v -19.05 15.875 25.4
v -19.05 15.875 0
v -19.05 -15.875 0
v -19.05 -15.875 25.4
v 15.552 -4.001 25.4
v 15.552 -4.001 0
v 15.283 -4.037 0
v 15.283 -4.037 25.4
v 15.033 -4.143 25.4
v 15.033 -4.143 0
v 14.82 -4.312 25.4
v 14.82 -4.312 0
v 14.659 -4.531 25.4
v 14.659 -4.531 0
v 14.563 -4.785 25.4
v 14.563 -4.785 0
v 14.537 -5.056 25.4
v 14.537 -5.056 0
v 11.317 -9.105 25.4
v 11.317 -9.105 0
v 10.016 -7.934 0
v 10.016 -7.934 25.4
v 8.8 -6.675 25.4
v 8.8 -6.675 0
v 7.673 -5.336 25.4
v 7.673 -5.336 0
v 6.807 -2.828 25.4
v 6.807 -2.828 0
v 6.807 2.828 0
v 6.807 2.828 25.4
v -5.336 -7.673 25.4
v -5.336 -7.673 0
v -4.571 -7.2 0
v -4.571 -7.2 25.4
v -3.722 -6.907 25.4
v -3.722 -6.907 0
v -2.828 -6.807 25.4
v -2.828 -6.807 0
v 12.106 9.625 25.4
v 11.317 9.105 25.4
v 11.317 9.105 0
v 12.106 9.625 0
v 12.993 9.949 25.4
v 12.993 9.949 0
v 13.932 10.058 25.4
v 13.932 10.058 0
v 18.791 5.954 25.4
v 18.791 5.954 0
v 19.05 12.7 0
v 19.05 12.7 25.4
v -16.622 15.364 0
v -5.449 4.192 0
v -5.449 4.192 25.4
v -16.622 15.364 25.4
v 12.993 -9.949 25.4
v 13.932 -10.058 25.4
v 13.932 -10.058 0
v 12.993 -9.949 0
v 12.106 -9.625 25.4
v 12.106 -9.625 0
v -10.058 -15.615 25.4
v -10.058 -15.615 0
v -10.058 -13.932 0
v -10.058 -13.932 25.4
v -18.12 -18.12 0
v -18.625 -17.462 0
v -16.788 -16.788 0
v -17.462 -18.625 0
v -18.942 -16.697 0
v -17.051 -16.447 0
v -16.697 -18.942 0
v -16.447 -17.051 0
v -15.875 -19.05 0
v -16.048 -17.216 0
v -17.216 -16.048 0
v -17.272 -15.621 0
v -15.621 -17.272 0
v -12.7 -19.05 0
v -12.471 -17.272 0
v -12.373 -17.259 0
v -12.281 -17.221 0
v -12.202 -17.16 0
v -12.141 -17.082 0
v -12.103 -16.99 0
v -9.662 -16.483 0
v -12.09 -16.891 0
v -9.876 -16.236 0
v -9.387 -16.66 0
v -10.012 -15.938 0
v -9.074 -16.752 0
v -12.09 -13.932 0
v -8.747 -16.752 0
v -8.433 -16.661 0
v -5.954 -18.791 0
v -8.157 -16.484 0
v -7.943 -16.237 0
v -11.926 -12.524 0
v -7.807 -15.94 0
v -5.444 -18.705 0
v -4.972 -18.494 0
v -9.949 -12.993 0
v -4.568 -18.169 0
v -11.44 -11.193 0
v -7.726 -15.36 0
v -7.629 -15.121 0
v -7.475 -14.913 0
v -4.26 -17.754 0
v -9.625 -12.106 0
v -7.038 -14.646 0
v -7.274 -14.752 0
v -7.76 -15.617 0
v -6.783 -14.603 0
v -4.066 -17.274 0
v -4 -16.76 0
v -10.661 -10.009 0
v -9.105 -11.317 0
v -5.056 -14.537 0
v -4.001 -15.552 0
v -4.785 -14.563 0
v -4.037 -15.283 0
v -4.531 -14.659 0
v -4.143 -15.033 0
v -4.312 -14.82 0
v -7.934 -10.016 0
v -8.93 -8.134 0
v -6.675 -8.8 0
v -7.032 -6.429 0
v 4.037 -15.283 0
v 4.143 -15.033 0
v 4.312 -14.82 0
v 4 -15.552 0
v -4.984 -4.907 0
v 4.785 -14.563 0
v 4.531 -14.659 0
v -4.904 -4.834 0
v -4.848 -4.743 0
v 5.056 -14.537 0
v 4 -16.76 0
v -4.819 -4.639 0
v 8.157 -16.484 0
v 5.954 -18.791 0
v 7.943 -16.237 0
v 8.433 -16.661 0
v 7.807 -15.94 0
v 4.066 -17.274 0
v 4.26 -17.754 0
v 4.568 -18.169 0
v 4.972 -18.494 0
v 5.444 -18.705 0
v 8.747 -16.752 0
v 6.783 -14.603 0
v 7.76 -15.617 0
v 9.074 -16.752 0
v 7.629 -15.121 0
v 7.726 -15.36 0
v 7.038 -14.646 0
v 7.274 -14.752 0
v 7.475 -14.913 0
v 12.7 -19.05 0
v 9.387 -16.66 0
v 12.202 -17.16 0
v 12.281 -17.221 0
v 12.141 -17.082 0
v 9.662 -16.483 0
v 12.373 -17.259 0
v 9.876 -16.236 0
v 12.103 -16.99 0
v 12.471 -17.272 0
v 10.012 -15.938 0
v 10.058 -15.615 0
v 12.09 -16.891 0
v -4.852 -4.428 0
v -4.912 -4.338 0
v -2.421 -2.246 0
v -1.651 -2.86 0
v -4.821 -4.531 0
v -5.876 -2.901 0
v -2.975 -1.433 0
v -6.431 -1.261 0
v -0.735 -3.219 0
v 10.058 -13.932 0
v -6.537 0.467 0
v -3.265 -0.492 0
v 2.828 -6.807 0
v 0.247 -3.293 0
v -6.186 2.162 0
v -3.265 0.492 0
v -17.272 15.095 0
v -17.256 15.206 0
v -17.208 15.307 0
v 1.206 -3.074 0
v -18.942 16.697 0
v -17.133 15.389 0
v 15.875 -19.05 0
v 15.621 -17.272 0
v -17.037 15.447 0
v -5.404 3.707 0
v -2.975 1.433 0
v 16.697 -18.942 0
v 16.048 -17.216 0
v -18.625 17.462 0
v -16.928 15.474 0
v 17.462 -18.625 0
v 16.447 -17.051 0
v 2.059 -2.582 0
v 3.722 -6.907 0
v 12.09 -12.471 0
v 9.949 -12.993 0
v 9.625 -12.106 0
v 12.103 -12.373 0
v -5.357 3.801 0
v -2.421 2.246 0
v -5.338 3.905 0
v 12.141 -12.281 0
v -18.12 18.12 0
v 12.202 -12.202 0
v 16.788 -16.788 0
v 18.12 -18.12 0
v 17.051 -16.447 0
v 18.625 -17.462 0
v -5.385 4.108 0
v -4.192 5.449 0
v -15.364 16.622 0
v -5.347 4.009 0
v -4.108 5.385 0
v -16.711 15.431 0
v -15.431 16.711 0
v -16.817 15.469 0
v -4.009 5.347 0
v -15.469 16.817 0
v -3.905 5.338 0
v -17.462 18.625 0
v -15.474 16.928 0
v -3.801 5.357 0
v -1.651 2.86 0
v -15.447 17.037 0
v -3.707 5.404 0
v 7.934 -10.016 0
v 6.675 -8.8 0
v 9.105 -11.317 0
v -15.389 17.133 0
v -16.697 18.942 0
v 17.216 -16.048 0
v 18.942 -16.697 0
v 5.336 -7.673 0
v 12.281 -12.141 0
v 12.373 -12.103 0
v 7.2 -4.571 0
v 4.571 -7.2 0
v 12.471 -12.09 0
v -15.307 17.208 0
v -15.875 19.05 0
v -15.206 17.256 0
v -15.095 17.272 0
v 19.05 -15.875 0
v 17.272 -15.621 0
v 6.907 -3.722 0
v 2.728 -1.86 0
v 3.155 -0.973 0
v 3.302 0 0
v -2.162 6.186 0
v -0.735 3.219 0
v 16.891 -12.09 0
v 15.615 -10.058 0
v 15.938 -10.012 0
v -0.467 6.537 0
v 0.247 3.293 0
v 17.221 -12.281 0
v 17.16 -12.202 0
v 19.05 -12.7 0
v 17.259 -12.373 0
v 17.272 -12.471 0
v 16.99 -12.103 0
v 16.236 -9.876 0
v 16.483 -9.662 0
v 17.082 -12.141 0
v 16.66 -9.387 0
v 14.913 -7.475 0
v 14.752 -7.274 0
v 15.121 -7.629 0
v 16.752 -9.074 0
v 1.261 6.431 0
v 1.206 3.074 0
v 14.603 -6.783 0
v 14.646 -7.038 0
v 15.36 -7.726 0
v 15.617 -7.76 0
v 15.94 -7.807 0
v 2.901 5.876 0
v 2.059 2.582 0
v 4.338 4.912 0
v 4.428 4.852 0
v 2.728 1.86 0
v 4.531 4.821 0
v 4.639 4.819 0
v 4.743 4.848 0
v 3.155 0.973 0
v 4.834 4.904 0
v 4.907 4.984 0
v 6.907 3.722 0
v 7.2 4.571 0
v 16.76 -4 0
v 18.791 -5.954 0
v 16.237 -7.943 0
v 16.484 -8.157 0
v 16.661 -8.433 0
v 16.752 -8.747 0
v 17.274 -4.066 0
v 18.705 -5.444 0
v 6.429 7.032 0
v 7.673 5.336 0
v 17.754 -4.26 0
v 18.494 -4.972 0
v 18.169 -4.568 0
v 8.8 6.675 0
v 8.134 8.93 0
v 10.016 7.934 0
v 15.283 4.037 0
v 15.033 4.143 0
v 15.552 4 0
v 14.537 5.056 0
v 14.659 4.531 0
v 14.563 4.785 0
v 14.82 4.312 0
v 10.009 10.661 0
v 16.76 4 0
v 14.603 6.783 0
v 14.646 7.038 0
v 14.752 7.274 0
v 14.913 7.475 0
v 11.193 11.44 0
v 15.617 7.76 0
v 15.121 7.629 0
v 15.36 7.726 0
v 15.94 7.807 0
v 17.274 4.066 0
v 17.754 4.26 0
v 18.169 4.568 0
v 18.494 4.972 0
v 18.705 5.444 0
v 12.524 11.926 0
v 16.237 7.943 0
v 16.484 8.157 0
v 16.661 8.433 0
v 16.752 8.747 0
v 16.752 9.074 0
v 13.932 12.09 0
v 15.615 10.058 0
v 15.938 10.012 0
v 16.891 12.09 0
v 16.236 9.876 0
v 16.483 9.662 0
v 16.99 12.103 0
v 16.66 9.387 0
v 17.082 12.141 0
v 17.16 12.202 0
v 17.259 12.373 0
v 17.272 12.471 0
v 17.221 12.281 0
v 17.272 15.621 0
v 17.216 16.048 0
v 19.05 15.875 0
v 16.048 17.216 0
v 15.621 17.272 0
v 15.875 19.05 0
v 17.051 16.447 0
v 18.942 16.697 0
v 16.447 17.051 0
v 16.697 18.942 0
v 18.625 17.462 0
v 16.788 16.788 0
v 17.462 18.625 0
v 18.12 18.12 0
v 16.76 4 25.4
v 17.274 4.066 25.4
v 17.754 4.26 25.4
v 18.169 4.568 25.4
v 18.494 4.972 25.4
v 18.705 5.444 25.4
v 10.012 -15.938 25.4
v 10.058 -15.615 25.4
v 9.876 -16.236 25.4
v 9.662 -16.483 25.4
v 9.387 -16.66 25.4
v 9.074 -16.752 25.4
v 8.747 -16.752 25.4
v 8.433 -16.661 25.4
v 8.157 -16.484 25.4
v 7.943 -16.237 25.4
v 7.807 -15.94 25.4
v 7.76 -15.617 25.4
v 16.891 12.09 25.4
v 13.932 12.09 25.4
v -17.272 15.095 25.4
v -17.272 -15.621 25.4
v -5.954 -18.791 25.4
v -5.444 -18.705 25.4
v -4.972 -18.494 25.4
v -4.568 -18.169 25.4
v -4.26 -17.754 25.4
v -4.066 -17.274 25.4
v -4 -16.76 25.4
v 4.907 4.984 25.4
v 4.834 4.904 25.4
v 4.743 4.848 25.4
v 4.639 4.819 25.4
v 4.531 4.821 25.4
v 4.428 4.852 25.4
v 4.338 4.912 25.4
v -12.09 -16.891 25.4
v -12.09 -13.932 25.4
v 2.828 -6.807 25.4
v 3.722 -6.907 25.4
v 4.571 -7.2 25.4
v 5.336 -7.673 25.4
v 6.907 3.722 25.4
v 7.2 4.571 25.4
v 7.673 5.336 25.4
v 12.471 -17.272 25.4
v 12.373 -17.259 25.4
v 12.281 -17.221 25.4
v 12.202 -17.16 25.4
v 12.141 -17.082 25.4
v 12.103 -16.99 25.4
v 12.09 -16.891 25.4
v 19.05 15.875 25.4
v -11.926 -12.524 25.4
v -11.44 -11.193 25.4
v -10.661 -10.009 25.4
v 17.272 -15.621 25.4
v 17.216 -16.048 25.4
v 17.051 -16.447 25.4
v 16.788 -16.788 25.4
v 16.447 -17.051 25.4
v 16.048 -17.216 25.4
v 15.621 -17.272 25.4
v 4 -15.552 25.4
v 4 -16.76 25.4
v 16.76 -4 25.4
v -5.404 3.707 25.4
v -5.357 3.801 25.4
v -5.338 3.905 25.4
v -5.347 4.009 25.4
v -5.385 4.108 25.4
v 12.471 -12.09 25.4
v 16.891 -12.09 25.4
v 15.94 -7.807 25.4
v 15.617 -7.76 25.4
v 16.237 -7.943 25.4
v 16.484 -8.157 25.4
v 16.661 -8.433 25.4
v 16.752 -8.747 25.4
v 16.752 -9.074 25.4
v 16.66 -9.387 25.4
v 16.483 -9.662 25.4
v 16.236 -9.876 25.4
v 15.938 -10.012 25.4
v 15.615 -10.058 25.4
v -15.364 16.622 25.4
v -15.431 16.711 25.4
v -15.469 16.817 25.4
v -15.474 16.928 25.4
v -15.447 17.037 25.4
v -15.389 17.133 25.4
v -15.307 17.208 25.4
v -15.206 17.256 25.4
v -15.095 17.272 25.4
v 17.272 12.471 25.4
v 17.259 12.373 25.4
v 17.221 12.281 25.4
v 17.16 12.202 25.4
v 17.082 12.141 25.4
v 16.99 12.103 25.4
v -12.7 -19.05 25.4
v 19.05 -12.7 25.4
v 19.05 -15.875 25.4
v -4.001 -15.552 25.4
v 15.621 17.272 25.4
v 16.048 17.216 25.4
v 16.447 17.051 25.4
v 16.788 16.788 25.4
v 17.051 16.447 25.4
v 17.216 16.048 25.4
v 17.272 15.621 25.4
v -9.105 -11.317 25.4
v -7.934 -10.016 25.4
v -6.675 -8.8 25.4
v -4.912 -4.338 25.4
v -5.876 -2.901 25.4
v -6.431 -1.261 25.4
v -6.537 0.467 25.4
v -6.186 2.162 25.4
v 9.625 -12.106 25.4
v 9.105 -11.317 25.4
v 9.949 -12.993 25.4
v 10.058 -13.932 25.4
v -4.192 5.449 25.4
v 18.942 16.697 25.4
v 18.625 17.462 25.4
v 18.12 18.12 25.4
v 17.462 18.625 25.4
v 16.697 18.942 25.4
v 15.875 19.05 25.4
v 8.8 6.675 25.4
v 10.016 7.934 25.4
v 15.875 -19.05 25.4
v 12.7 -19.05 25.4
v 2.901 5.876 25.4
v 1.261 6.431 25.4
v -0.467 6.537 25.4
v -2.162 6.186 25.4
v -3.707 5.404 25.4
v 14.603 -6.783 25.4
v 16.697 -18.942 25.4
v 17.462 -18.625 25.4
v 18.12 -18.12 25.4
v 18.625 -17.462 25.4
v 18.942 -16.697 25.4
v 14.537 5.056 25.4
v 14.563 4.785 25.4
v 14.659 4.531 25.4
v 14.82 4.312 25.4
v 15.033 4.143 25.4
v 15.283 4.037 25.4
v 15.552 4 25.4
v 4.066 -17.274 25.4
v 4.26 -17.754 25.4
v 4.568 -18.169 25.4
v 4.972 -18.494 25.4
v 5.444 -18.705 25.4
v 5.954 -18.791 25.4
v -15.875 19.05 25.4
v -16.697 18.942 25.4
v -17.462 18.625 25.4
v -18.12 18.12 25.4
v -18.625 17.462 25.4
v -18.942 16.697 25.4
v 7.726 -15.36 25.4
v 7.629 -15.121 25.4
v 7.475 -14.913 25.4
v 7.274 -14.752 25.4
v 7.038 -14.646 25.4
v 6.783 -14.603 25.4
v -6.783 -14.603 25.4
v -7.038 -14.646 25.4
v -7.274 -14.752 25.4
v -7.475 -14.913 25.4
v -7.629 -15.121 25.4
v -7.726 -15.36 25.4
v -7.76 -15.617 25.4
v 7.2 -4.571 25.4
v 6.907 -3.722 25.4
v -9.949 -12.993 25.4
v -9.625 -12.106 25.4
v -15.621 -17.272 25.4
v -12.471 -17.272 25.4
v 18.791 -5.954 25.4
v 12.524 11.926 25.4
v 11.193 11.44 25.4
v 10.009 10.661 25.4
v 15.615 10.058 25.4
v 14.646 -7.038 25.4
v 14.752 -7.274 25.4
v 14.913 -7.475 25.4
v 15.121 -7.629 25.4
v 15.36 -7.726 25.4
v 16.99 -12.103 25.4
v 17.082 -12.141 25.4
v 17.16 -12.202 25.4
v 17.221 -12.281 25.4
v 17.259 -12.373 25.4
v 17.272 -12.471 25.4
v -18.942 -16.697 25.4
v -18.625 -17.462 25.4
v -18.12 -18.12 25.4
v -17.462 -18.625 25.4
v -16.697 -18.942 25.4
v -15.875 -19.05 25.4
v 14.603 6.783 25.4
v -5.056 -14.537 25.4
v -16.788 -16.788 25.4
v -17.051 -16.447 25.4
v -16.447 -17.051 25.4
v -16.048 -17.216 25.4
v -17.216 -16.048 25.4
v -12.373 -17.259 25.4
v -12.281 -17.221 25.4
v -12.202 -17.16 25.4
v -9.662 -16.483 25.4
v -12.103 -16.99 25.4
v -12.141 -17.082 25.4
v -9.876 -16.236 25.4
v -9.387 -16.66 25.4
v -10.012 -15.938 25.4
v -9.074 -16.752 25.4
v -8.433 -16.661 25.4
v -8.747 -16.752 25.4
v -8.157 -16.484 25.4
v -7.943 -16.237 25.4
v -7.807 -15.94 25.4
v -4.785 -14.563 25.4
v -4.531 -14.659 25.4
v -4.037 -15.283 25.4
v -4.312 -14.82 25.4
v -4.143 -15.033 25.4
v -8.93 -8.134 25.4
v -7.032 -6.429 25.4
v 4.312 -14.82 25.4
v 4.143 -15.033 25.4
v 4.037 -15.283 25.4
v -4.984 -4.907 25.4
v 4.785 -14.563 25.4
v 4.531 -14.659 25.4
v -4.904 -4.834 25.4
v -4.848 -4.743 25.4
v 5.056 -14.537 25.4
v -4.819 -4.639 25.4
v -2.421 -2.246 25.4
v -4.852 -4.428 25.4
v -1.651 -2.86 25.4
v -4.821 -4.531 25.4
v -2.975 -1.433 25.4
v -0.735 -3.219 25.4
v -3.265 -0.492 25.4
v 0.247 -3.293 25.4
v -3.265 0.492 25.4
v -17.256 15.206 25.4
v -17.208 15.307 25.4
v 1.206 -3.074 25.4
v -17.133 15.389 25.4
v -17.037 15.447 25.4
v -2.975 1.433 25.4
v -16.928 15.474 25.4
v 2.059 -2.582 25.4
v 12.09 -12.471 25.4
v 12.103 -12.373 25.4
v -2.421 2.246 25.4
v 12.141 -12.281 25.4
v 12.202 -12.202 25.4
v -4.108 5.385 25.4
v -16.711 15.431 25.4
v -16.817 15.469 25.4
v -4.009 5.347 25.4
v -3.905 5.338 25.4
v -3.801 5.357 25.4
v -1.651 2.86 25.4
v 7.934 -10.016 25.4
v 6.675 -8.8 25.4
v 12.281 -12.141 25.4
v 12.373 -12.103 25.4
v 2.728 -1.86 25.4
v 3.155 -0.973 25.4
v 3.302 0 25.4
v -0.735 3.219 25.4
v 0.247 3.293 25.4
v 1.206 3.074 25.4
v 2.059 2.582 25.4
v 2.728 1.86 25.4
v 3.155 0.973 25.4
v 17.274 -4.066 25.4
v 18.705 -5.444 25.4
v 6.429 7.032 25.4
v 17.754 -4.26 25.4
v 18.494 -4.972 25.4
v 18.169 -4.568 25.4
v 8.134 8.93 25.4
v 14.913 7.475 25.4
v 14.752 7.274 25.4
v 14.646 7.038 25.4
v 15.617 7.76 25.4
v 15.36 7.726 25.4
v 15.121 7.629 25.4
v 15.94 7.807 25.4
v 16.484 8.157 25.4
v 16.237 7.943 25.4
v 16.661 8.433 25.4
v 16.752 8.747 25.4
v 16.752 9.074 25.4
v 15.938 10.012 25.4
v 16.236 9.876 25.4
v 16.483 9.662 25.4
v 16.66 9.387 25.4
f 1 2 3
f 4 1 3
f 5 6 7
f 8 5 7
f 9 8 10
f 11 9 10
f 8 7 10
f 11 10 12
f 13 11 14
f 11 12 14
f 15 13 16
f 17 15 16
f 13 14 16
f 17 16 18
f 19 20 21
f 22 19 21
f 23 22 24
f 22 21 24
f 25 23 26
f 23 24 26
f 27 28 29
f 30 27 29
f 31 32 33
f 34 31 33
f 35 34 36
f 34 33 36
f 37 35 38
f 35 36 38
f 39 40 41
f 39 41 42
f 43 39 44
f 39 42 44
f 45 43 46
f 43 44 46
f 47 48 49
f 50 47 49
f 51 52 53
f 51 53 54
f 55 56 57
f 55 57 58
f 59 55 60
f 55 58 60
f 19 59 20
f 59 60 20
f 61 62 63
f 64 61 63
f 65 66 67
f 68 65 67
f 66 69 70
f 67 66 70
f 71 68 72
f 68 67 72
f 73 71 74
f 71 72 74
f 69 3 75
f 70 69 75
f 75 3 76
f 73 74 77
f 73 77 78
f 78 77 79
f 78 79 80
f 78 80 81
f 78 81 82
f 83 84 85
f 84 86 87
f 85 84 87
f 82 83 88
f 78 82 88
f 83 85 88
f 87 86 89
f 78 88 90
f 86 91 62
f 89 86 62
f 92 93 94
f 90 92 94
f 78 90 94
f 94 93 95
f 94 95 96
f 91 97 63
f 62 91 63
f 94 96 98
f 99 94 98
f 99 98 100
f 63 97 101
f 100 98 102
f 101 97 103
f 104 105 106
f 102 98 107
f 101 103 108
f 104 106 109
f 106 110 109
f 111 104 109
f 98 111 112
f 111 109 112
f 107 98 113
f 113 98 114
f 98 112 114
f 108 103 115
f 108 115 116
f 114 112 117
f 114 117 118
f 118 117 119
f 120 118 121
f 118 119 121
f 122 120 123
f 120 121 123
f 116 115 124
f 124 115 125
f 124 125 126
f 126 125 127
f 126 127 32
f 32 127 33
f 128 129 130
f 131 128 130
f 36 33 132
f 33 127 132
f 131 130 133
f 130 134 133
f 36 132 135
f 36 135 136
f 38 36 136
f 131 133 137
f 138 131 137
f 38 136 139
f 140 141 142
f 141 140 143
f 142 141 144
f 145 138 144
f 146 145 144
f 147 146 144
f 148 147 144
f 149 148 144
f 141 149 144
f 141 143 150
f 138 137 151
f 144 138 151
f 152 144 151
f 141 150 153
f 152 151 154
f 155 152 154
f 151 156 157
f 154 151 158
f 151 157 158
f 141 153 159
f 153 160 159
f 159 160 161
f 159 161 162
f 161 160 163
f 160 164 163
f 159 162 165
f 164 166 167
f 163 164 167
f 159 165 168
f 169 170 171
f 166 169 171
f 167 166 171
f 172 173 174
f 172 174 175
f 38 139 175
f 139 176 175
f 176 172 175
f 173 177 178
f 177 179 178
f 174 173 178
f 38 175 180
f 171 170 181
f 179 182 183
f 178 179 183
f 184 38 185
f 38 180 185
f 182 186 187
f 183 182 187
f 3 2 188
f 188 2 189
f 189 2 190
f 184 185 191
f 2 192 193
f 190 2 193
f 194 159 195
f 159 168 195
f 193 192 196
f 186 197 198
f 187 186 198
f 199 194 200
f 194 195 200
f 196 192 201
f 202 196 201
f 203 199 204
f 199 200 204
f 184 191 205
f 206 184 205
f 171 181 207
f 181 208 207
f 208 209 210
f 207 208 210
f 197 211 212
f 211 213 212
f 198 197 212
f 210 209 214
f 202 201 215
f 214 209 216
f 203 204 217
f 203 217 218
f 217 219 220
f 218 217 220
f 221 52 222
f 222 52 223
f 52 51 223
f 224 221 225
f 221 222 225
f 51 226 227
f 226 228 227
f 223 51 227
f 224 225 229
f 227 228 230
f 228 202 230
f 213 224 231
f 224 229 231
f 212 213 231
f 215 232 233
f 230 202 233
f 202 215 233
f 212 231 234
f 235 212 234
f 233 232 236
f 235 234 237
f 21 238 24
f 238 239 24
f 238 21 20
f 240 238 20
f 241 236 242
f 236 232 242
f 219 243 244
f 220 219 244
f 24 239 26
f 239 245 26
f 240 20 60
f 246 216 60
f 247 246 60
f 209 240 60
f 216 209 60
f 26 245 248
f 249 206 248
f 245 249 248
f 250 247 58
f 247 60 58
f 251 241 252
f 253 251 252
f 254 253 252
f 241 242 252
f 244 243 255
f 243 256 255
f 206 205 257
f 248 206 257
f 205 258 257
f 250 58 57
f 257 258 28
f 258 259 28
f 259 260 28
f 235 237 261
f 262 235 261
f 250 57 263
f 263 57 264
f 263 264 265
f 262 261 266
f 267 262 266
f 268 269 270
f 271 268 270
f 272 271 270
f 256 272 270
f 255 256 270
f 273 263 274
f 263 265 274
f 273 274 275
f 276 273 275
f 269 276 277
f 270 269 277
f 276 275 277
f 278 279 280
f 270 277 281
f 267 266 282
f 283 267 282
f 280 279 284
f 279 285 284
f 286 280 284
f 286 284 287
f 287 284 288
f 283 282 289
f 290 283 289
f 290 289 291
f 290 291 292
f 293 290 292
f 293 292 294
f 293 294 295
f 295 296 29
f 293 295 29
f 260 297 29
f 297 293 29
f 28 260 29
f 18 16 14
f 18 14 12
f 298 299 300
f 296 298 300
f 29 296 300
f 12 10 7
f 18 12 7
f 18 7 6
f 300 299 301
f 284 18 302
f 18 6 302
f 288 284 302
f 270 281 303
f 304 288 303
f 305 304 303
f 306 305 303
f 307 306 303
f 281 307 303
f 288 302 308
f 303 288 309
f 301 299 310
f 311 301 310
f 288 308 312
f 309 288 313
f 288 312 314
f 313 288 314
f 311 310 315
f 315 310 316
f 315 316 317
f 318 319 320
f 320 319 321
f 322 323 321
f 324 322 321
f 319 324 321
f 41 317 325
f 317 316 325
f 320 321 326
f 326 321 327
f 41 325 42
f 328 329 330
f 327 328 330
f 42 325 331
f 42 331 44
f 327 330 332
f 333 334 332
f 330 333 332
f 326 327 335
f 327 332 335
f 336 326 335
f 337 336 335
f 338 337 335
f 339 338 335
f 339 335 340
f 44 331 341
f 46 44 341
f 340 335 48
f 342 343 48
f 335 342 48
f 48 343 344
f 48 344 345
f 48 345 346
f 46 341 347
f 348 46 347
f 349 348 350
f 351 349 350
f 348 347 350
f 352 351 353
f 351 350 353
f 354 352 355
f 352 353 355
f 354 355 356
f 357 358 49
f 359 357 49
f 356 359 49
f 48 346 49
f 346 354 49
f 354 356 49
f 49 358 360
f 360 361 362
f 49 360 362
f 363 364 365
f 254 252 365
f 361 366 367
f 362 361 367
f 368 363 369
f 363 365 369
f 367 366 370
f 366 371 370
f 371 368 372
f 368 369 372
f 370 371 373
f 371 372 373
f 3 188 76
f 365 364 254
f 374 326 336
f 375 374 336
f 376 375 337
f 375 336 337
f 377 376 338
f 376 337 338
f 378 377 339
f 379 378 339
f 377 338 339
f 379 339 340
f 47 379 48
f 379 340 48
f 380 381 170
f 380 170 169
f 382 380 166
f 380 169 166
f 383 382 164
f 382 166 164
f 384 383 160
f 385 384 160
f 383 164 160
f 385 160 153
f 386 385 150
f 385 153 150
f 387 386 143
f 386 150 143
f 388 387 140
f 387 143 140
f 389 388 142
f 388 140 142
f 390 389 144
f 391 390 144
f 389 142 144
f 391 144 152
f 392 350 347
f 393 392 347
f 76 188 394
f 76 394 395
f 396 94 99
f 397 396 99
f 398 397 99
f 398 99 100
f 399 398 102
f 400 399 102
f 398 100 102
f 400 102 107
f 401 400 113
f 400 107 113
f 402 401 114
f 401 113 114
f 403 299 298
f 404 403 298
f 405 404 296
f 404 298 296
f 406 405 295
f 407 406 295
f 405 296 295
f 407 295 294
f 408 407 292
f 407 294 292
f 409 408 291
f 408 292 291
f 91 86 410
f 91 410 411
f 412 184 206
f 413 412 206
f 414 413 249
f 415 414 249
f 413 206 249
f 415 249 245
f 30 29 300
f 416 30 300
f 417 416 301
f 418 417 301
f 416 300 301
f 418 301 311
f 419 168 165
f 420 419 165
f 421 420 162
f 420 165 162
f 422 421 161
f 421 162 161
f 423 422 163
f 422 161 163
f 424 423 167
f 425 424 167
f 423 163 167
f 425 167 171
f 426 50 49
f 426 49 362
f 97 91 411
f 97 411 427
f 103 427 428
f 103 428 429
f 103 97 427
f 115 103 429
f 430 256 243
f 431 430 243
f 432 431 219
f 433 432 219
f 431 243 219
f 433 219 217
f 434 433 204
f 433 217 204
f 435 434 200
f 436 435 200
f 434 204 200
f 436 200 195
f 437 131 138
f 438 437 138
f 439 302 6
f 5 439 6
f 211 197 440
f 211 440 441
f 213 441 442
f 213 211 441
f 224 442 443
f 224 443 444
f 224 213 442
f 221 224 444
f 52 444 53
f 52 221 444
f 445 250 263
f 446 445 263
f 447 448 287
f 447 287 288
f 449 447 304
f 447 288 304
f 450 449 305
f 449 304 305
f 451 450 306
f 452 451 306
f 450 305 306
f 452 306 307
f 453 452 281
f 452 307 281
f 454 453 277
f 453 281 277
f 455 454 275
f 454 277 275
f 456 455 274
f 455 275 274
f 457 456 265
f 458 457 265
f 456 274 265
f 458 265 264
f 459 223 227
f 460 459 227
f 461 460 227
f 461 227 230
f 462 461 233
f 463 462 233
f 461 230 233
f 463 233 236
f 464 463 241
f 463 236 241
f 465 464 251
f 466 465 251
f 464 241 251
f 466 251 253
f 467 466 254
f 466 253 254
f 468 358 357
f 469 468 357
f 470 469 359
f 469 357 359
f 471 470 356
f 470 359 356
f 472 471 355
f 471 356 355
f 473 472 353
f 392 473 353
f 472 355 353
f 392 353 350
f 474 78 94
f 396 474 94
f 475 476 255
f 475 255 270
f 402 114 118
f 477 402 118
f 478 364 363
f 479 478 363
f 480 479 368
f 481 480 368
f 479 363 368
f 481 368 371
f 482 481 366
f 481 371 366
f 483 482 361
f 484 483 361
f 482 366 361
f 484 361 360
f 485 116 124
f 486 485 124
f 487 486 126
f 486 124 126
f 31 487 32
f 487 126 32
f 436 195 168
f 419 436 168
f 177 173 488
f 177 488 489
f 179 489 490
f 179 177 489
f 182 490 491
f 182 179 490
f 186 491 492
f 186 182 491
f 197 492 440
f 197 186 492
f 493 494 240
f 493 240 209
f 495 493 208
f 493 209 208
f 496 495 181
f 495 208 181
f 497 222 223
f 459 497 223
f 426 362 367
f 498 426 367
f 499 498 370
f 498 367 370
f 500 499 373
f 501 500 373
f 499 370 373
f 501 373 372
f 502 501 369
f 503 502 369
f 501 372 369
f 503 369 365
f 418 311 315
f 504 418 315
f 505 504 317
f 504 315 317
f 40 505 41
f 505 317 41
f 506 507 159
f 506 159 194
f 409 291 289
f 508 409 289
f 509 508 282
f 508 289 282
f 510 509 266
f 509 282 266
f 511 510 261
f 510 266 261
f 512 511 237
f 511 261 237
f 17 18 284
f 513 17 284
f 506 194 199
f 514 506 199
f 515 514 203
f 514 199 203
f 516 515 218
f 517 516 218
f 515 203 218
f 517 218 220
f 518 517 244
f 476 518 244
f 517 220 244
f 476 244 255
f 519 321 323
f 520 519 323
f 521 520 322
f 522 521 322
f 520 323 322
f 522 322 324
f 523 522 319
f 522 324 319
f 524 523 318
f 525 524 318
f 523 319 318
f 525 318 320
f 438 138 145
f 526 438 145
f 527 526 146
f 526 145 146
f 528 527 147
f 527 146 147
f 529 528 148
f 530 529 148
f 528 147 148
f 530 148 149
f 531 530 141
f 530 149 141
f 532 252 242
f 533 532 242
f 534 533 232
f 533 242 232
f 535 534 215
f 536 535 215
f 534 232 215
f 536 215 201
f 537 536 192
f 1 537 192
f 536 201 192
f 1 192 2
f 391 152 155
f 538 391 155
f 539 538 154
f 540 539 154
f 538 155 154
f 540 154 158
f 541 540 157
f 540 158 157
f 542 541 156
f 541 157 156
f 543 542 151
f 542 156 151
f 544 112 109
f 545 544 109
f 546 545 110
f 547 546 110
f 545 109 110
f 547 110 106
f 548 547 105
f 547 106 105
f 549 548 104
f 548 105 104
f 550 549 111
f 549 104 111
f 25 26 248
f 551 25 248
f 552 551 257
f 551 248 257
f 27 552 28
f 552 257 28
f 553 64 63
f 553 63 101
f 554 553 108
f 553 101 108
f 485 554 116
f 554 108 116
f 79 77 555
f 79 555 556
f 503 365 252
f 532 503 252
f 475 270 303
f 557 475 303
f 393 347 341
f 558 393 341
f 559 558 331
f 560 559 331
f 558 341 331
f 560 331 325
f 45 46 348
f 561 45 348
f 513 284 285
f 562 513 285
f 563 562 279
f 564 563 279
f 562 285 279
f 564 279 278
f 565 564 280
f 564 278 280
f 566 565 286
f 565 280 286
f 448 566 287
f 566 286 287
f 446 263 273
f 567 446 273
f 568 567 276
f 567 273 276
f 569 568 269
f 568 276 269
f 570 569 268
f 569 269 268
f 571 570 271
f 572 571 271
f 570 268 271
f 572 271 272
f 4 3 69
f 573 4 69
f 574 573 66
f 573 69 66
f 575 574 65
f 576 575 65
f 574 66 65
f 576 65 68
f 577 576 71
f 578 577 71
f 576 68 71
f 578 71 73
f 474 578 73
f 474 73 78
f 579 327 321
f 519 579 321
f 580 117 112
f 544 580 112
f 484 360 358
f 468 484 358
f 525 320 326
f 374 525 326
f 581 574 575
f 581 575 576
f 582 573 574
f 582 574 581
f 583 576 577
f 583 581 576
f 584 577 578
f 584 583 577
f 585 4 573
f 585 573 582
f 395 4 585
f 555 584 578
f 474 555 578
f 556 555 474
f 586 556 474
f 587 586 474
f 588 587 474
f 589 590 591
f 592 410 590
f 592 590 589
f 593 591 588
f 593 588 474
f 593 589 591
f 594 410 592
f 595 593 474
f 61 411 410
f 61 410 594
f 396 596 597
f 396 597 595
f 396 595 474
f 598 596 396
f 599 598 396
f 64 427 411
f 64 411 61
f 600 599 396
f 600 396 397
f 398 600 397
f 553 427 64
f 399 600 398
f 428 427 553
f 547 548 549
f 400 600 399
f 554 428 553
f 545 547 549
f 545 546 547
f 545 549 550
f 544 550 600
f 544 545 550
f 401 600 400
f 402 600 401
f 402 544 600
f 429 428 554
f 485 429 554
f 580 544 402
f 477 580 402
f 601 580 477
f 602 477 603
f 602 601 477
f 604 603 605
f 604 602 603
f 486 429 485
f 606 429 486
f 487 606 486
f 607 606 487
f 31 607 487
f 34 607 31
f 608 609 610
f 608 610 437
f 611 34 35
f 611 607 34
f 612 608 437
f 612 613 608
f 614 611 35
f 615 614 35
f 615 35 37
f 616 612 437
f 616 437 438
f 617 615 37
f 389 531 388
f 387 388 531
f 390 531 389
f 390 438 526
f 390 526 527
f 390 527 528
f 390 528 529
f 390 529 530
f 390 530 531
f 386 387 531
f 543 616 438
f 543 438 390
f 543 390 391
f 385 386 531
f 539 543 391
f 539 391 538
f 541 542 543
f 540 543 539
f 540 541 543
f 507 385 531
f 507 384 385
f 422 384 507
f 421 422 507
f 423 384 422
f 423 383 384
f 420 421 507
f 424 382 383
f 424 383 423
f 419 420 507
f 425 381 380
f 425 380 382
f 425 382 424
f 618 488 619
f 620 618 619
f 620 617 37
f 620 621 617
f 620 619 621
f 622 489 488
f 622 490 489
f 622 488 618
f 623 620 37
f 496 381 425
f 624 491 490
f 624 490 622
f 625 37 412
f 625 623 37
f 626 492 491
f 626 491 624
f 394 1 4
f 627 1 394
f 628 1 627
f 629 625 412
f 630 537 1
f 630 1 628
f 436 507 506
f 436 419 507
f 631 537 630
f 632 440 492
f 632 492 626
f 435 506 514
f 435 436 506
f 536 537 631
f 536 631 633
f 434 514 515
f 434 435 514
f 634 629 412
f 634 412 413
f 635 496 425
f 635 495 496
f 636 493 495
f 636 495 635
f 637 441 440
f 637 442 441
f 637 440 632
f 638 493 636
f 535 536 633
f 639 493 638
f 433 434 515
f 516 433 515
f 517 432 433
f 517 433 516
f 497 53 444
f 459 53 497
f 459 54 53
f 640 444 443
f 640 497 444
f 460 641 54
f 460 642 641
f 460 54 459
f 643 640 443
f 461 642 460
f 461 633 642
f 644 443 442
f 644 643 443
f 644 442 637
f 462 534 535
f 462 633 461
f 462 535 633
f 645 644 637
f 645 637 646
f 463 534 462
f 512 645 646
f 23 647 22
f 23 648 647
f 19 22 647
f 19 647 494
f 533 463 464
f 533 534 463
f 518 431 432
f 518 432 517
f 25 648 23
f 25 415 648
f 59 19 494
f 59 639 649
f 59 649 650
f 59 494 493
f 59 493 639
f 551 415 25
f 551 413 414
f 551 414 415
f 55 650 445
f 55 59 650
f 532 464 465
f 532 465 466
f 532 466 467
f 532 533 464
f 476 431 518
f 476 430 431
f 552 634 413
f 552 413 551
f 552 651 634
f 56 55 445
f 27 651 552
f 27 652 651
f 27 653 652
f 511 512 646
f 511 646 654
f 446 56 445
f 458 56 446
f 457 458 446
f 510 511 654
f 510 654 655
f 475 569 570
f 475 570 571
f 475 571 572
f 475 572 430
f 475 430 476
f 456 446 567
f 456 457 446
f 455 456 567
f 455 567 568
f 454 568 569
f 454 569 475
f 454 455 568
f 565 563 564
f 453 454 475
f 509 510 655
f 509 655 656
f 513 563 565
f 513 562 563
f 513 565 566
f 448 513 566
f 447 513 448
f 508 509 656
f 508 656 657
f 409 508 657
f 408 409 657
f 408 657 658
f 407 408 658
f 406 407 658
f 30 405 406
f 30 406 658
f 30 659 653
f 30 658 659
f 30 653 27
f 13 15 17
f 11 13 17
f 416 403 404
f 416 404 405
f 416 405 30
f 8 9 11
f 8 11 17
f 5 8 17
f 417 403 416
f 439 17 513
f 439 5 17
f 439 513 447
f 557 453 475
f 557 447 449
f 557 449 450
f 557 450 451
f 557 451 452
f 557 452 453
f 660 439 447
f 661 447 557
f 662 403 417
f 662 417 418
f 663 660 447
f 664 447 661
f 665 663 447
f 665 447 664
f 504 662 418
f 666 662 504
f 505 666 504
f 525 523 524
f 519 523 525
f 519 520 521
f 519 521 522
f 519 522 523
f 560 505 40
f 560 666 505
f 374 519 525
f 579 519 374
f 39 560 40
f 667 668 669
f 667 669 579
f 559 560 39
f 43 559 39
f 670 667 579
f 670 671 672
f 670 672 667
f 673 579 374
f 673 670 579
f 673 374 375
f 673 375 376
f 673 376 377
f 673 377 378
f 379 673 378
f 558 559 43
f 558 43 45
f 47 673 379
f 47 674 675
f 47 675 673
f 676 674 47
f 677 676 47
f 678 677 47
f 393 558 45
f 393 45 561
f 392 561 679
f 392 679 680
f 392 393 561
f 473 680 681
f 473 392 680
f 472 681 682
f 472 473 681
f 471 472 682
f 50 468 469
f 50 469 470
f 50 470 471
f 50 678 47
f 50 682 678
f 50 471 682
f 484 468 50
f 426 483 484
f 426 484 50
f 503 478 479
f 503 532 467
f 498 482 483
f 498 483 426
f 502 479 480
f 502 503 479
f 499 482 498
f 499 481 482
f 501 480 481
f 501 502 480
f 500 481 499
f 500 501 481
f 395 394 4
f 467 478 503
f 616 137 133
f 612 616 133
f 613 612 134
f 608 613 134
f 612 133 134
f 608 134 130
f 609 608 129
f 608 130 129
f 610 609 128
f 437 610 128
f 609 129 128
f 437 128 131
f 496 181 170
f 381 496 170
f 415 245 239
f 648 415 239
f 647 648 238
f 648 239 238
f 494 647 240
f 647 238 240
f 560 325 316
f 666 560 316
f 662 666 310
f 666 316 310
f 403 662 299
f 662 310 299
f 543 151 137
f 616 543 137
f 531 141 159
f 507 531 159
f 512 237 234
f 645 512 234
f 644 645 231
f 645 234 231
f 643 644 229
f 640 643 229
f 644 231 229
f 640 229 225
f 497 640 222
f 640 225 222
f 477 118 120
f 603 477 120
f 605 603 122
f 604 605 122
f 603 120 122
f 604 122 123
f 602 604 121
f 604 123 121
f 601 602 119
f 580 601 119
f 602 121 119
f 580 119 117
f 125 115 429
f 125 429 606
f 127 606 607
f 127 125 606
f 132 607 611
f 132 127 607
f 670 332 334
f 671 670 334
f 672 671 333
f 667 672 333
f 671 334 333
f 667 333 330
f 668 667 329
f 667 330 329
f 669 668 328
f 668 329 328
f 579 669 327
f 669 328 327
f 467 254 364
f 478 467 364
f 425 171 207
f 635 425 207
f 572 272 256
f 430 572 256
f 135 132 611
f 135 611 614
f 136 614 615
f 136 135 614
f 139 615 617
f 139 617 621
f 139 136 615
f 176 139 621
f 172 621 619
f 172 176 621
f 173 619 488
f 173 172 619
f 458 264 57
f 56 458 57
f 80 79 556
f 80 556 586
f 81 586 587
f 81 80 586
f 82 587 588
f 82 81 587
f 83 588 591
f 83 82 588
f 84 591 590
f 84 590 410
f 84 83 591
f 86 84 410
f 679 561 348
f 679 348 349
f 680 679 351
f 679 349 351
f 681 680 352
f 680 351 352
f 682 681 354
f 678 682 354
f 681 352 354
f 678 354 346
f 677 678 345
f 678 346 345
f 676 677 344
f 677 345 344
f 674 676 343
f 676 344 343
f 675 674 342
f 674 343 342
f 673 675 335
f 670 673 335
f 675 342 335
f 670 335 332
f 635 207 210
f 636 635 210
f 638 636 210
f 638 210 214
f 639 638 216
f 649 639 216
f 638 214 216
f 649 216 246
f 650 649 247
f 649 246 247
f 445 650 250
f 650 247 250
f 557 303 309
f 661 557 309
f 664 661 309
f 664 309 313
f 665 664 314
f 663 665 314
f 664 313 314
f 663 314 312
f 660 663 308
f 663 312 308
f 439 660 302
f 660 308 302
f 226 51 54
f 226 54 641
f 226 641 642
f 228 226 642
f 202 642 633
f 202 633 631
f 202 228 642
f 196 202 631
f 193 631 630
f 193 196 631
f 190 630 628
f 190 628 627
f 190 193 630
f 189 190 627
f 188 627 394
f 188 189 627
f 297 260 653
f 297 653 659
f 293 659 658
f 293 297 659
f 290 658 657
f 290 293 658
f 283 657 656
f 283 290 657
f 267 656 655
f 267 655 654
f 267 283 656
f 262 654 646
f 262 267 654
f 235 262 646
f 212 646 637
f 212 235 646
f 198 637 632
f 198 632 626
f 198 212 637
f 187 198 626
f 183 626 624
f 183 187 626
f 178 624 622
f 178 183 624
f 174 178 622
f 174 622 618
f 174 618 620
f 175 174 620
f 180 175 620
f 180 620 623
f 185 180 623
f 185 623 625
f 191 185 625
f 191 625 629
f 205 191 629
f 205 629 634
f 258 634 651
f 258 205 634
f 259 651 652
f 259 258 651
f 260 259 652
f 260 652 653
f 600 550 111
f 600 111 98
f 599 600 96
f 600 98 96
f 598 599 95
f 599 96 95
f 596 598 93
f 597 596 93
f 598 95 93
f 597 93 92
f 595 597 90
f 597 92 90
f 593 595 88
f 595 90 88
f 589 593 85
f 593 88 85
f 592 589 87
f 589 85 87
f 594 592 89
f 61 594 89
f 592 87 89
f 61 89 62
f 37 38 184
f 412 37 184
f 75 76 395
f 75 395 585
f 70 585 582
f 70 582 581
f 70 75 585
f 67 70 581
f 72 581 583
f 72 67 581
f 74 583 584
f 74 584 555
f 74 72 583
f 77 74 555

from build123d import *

# Parameters (mm, degrees)
SKETCH1_R      = 3.302
EXTRUDE1_DEPTH = 25.4


with BuildPart() as part:
    # Sketch1 → Extrude1 (new body)
    with BuildSketch(Plane.XY):
        with BuildLine():
            Line((15.875, 19.05), (-15.875, 19.05))
            ThreePointArc((-15.875, 19.05), (-18.12006403, 18.12006403), (-19.05, 15.875))
            Line((-19.05, 15.875), (-19.05, -15.875))
            ThreePointArc((-19.05, -15.875), (-18.12006403, -18.12006403), (-15.875, -19.05))
            Line((-15.875, -19.05), (-12.7, -19.05))
            Line((-12.7, -19.05), (-5.954495972, -18.790863874))
            ThreePointArc((-5.954495972, -18.790863874), (-4.568340141, -18.169354143), (-4.0005, -16.760361628))
            Line((-4.0005, -16.760361628), (-4.0005, -15.552069001))
            ThreePointArc((-4.0005, -15.552069001), (-4.312003742, -14.819989072), (-5.055502014, -14.536817878))
            Line((-5.055502014, -14.536817878), (-6.782702014, -14.603170209))
            ThreePointArc((-6.782702014, -14.603170209), (-7.475165883, -14.913287543), (-7.759698458, -15.616651022))
            ThreePointArc((-7.759698458, -15.616651022), (-8.91004969, -16.763999564), (-10.0584, -15.614648356))
            Line((-10.0584, -15.614648356), (-10.0584, -13.931647412))
            ThreePointArc((-10.0584, -13.931647412), (-9.812696364, -12.53999053), (-9.105295238, -11.316608824))
            ThreePointArc((-9.105295238, -11.316608824), (-7.314841404, -9.397406099), (-5.335891418, -7.673219048))
            ThreePointArc((-5.335891418, -7.673219048), (-4.154656747, -7.029801128), (-2.828100791, -6.8072))
            Line((-2.828100791, -6.8072), (0, -6.8072))
            Line((0, -6.8072), (2.828100791, -6.8072))
            ThreePointArc((2.828100791, -6.8072), (4.154656747, -7.029801128), (5.335891418, -7.673219048))
            ThreePointArc((5.335891418, -7.673219048), (7.314841404, -9.397406099), (9.105295238, -11.316608824))
            ThreePointArc((9.105295238, -11.316608824), (9.812696364, -12.53999053), (10.0584, -13.931647412))
            Line((10.0584, -13.931647412), (10.0584, -15.614648356))
            ThreePointArc((10.0584, -15.614648356), (8.91004969, -16.763999564), (7.759698458, -15.616651022))
            ThreePointArc((7.759698458, -15.616651022), (7.475165883, -14.913287543), (6.782702014, -14.603170209))
            Line((6.782702014, -14.603170209), (5.055502014, -14.536817878))
            ThreePointArc((5.055502014, -14.536817878), (4.312003742, -14.819989072), (4.0005, -15.552069001))
            Line((4.0005, -15.552069001), (4.0005, -16.760361628))
            ThreePointArc((4.0005, -16.760361628), (4.568340141, -18.169354143), (5.954495972, -18.790863874))
            Line((5.954495972, -18.790863874), (12.7, -19.05))
            Line((12.7, -19.05), (15.875, -19.05))
            ThreePointArc((15.875, -19.05), (18.12006403, -18.12006403), (19.05, -15.875))
            Line((19.05, -15.875), (19.05, -12.7))
            Line((19.05, -12.7), (18.790863874, -5.954495972))
            ThreePointArc((18.790863874, -5.954495972), (18.169354143, -4.568340141), (16.760361628, -4.0005))
            Line((16.760361628, -4.0005), (15.552069001, -4.0005))
            ThreePointArc((15.552069001, -4.0005), (14.819989072, -4.312003742), (14.536817878, -5.055502014))
            Line((14.536817878, -5.055502014), (14.603170209, -6.782702014))
            ThreePointArc((14.603170209, -6.782702014), (14.913287543, -7.475165883), (15.616651022, -7.759698458))
            ThreePointArc((15.616651022, -7.759698458), (16.763999564, -8.91004969), (15.614648356, -10.0584))
            Line((15.614648356, -10.0584), (13.931647412, -10.0584))
            ThreePointArc((13.931647412, -10.0584), (12.53999053, -9.812696364), (11.316608824, -9.105295238))
            ThreePointArc((11.316608824, -9.105295238), (9.397406099, -7.314841404), (7.673219048, -5.335891418))
            ThreePointArc((7.673219048, -5.335891418), (7.029801128, -4.154656747), (6.8072, -2.828100791))
            Line((6.8072, -2.828100791), (6.8072, 0))
            Line((6.8072, 0), (6.8072, 2.828100791))
            ThreePointArc((6.8072, 2.828100791), (7.029801128, 4.154656747), (7.673219048, 5.335891418))
            ThreePointArc((7.673219048, 5.335891418), (9.397406099, 7.314841404), (11.316608824, 9.105295238))
            ThreePointArc((11.316608824, 9.105295238), (12.53999053, 9.812696364), (13.931647412, 10.0584))
            Line((13.931647412, 10.0584), (15.614648356, 10.0584))
            ThreePointArc((15.614648356, 10.0584), (16.763999564, 8.91004969), (15.616651022, 7.759698458))
            ThreePointArc((15.616651022, 7.759698458), (14.913287543, 7.475165883), (14.603170209, 6.782702014))
            Line((14.603170209, 6.782702014), (14.536817878, 5.055502014))
            ThreePointArc((14.536817878, 5.055502014), (14.819989072, 4.312003742), (15.552069001, 4.0005))
            Line((15.552069001, 4.0005), (16.760361628, 4.0005))
            ThreePointArc((16.760361628, 4.0005), (18.169354143, 4.568340141), (18.790863874, 5.954495972))
            Line((18.790863874, 5.954495972), (19.05, 12.7))
            Line((19.05, 12.7), (19.05, 15.875))
            ThreePointArc((19.05, 15.875), (18.12006403, 18.12006403), (15.875, 19.05))
        make_face()
        Circle(SKETCH1_R, mode=Mode.SUBTRACT)
        with BuildLine():
            Line((-4.191663684, 5.448899541), (-15.364356459, 16.621592316))
            ThreePointArc((-15.364356459, 16.621592316), (-15.446946878, 17.036802388), (-15.094948776, 17.272))
            Line((-15.094948776, 17.272), (15.621, 17.272))
            ThreePointArc((15.621, 17.272), (16.788433296, 16.788433296), (17.272, 15.621))
            Line((17.272, 15.621), (17.272, 12.4714))
            ThreePointArc((17.272, 12.4714), (17.160407684, 12.201992316), (16.891, 12.0904))
            Line((16.891, 12.0904), (13.931647412, 12.0904))
            ThreePointArc((13.931647412, 12.0904), (11.84416209, 11.721844546), (10.00908953, 10.660742857))
            ThreePointArc((10.00908953, 10.660742857), (7.259428949, 8.000870719), (4.906547928, 4.984332303))
            ThreePointArc((4.906547928, 4.984332303), (4.638901343, 4.819224111), (4.338293085, 4.91158257))
            ThreePointArc((4.338293085, 4.91158257), (0.40044901, 6.540953358), (-3.706747429, 5.40411452))
            ThreePointArc((-3.706747429, 5.40411452), (-3.957294594, 5.338921804), (-4.191663684, 5.448899541))
        make_face(mode=Mode.SUBTRACT)
        with BuildLine():
            Line((-5.448899541, 4.191663684), (-16.621592316, 15.364356459))
            ThreePointArc((-16.621592316, 15.364356459), (-17.036802388, 15.446946878), (-17.272, 15.094948776))
            Line((-17.272, 15.094948776), (-17.272, -15.621))
            ThreePointArc((-17.272, -15.621), (-16.788433296, -16.788433296), (-15.621, -17.272))
            Line((-15.621, -17.272), (-12.4714, -17.272))
            ThreePointArc((-12.4714, -17.272), (-12.201992316, -17.160407684), (-12.0904, -16.891))
            Line((-12.0904, -16.891), (-12.0904, -13.931647412))
            ThreePointArc((-12.0904, -13.931647412), (-11.721844546, -11.84416209), (-10.660742857, -10.00908953))
            ThreePointArc((-10.660742857, -10.00908953), (-8.000870719, -7.259428949), (-4.984332303, -4.906547928))
            ThreePointArc((-4.984332303, -4.906547928), (-4.819224111, -4.638901343), (-4.91158257, -4.338293085))
            ThreePointArc((-4.91158257, -4.338293085), (-6.540953358, -0.40044901), (-5.40411452, 3.706747429))
            ThreePointArc((-5.40411452, 3.706747429), (-5.338921804, 3.957294594), (-5.448899541, 4.191663684))
        make_face(mode=Mode.SUBTRACT)
        with BuildLine():
            Line((12.4714, -12.0904), (16.891, -12.0904))
            ThreePointArc((16.891, -12.0904), (17.160407684, -12.201992316), (17.272, -12.4714))
            Line((17.272, -12.4714), (17.272, -15.621))
            ThreePointArc((17.272, -15.621), (16.788433296, -16.788433296), (15.621, -17.272))
            Line((15.621, -17.272), (12.4714, -17.272))
            ThreePointArc((12.4714, -17.272), (12.201992316, -17.160407684), (12.0904, -16.891))
            Line((12.0904, -16.891), (12.0904, -12.4714))
            ThreePointArc((12.0904, -12.4714), (12.201992316, -12.201992316), (12.4714, -12.0904))
        make_face(mode=Mode.SUBTRACT)
    extrude(amount=EXTRUDE1_DEPTH)


solid = part.part
